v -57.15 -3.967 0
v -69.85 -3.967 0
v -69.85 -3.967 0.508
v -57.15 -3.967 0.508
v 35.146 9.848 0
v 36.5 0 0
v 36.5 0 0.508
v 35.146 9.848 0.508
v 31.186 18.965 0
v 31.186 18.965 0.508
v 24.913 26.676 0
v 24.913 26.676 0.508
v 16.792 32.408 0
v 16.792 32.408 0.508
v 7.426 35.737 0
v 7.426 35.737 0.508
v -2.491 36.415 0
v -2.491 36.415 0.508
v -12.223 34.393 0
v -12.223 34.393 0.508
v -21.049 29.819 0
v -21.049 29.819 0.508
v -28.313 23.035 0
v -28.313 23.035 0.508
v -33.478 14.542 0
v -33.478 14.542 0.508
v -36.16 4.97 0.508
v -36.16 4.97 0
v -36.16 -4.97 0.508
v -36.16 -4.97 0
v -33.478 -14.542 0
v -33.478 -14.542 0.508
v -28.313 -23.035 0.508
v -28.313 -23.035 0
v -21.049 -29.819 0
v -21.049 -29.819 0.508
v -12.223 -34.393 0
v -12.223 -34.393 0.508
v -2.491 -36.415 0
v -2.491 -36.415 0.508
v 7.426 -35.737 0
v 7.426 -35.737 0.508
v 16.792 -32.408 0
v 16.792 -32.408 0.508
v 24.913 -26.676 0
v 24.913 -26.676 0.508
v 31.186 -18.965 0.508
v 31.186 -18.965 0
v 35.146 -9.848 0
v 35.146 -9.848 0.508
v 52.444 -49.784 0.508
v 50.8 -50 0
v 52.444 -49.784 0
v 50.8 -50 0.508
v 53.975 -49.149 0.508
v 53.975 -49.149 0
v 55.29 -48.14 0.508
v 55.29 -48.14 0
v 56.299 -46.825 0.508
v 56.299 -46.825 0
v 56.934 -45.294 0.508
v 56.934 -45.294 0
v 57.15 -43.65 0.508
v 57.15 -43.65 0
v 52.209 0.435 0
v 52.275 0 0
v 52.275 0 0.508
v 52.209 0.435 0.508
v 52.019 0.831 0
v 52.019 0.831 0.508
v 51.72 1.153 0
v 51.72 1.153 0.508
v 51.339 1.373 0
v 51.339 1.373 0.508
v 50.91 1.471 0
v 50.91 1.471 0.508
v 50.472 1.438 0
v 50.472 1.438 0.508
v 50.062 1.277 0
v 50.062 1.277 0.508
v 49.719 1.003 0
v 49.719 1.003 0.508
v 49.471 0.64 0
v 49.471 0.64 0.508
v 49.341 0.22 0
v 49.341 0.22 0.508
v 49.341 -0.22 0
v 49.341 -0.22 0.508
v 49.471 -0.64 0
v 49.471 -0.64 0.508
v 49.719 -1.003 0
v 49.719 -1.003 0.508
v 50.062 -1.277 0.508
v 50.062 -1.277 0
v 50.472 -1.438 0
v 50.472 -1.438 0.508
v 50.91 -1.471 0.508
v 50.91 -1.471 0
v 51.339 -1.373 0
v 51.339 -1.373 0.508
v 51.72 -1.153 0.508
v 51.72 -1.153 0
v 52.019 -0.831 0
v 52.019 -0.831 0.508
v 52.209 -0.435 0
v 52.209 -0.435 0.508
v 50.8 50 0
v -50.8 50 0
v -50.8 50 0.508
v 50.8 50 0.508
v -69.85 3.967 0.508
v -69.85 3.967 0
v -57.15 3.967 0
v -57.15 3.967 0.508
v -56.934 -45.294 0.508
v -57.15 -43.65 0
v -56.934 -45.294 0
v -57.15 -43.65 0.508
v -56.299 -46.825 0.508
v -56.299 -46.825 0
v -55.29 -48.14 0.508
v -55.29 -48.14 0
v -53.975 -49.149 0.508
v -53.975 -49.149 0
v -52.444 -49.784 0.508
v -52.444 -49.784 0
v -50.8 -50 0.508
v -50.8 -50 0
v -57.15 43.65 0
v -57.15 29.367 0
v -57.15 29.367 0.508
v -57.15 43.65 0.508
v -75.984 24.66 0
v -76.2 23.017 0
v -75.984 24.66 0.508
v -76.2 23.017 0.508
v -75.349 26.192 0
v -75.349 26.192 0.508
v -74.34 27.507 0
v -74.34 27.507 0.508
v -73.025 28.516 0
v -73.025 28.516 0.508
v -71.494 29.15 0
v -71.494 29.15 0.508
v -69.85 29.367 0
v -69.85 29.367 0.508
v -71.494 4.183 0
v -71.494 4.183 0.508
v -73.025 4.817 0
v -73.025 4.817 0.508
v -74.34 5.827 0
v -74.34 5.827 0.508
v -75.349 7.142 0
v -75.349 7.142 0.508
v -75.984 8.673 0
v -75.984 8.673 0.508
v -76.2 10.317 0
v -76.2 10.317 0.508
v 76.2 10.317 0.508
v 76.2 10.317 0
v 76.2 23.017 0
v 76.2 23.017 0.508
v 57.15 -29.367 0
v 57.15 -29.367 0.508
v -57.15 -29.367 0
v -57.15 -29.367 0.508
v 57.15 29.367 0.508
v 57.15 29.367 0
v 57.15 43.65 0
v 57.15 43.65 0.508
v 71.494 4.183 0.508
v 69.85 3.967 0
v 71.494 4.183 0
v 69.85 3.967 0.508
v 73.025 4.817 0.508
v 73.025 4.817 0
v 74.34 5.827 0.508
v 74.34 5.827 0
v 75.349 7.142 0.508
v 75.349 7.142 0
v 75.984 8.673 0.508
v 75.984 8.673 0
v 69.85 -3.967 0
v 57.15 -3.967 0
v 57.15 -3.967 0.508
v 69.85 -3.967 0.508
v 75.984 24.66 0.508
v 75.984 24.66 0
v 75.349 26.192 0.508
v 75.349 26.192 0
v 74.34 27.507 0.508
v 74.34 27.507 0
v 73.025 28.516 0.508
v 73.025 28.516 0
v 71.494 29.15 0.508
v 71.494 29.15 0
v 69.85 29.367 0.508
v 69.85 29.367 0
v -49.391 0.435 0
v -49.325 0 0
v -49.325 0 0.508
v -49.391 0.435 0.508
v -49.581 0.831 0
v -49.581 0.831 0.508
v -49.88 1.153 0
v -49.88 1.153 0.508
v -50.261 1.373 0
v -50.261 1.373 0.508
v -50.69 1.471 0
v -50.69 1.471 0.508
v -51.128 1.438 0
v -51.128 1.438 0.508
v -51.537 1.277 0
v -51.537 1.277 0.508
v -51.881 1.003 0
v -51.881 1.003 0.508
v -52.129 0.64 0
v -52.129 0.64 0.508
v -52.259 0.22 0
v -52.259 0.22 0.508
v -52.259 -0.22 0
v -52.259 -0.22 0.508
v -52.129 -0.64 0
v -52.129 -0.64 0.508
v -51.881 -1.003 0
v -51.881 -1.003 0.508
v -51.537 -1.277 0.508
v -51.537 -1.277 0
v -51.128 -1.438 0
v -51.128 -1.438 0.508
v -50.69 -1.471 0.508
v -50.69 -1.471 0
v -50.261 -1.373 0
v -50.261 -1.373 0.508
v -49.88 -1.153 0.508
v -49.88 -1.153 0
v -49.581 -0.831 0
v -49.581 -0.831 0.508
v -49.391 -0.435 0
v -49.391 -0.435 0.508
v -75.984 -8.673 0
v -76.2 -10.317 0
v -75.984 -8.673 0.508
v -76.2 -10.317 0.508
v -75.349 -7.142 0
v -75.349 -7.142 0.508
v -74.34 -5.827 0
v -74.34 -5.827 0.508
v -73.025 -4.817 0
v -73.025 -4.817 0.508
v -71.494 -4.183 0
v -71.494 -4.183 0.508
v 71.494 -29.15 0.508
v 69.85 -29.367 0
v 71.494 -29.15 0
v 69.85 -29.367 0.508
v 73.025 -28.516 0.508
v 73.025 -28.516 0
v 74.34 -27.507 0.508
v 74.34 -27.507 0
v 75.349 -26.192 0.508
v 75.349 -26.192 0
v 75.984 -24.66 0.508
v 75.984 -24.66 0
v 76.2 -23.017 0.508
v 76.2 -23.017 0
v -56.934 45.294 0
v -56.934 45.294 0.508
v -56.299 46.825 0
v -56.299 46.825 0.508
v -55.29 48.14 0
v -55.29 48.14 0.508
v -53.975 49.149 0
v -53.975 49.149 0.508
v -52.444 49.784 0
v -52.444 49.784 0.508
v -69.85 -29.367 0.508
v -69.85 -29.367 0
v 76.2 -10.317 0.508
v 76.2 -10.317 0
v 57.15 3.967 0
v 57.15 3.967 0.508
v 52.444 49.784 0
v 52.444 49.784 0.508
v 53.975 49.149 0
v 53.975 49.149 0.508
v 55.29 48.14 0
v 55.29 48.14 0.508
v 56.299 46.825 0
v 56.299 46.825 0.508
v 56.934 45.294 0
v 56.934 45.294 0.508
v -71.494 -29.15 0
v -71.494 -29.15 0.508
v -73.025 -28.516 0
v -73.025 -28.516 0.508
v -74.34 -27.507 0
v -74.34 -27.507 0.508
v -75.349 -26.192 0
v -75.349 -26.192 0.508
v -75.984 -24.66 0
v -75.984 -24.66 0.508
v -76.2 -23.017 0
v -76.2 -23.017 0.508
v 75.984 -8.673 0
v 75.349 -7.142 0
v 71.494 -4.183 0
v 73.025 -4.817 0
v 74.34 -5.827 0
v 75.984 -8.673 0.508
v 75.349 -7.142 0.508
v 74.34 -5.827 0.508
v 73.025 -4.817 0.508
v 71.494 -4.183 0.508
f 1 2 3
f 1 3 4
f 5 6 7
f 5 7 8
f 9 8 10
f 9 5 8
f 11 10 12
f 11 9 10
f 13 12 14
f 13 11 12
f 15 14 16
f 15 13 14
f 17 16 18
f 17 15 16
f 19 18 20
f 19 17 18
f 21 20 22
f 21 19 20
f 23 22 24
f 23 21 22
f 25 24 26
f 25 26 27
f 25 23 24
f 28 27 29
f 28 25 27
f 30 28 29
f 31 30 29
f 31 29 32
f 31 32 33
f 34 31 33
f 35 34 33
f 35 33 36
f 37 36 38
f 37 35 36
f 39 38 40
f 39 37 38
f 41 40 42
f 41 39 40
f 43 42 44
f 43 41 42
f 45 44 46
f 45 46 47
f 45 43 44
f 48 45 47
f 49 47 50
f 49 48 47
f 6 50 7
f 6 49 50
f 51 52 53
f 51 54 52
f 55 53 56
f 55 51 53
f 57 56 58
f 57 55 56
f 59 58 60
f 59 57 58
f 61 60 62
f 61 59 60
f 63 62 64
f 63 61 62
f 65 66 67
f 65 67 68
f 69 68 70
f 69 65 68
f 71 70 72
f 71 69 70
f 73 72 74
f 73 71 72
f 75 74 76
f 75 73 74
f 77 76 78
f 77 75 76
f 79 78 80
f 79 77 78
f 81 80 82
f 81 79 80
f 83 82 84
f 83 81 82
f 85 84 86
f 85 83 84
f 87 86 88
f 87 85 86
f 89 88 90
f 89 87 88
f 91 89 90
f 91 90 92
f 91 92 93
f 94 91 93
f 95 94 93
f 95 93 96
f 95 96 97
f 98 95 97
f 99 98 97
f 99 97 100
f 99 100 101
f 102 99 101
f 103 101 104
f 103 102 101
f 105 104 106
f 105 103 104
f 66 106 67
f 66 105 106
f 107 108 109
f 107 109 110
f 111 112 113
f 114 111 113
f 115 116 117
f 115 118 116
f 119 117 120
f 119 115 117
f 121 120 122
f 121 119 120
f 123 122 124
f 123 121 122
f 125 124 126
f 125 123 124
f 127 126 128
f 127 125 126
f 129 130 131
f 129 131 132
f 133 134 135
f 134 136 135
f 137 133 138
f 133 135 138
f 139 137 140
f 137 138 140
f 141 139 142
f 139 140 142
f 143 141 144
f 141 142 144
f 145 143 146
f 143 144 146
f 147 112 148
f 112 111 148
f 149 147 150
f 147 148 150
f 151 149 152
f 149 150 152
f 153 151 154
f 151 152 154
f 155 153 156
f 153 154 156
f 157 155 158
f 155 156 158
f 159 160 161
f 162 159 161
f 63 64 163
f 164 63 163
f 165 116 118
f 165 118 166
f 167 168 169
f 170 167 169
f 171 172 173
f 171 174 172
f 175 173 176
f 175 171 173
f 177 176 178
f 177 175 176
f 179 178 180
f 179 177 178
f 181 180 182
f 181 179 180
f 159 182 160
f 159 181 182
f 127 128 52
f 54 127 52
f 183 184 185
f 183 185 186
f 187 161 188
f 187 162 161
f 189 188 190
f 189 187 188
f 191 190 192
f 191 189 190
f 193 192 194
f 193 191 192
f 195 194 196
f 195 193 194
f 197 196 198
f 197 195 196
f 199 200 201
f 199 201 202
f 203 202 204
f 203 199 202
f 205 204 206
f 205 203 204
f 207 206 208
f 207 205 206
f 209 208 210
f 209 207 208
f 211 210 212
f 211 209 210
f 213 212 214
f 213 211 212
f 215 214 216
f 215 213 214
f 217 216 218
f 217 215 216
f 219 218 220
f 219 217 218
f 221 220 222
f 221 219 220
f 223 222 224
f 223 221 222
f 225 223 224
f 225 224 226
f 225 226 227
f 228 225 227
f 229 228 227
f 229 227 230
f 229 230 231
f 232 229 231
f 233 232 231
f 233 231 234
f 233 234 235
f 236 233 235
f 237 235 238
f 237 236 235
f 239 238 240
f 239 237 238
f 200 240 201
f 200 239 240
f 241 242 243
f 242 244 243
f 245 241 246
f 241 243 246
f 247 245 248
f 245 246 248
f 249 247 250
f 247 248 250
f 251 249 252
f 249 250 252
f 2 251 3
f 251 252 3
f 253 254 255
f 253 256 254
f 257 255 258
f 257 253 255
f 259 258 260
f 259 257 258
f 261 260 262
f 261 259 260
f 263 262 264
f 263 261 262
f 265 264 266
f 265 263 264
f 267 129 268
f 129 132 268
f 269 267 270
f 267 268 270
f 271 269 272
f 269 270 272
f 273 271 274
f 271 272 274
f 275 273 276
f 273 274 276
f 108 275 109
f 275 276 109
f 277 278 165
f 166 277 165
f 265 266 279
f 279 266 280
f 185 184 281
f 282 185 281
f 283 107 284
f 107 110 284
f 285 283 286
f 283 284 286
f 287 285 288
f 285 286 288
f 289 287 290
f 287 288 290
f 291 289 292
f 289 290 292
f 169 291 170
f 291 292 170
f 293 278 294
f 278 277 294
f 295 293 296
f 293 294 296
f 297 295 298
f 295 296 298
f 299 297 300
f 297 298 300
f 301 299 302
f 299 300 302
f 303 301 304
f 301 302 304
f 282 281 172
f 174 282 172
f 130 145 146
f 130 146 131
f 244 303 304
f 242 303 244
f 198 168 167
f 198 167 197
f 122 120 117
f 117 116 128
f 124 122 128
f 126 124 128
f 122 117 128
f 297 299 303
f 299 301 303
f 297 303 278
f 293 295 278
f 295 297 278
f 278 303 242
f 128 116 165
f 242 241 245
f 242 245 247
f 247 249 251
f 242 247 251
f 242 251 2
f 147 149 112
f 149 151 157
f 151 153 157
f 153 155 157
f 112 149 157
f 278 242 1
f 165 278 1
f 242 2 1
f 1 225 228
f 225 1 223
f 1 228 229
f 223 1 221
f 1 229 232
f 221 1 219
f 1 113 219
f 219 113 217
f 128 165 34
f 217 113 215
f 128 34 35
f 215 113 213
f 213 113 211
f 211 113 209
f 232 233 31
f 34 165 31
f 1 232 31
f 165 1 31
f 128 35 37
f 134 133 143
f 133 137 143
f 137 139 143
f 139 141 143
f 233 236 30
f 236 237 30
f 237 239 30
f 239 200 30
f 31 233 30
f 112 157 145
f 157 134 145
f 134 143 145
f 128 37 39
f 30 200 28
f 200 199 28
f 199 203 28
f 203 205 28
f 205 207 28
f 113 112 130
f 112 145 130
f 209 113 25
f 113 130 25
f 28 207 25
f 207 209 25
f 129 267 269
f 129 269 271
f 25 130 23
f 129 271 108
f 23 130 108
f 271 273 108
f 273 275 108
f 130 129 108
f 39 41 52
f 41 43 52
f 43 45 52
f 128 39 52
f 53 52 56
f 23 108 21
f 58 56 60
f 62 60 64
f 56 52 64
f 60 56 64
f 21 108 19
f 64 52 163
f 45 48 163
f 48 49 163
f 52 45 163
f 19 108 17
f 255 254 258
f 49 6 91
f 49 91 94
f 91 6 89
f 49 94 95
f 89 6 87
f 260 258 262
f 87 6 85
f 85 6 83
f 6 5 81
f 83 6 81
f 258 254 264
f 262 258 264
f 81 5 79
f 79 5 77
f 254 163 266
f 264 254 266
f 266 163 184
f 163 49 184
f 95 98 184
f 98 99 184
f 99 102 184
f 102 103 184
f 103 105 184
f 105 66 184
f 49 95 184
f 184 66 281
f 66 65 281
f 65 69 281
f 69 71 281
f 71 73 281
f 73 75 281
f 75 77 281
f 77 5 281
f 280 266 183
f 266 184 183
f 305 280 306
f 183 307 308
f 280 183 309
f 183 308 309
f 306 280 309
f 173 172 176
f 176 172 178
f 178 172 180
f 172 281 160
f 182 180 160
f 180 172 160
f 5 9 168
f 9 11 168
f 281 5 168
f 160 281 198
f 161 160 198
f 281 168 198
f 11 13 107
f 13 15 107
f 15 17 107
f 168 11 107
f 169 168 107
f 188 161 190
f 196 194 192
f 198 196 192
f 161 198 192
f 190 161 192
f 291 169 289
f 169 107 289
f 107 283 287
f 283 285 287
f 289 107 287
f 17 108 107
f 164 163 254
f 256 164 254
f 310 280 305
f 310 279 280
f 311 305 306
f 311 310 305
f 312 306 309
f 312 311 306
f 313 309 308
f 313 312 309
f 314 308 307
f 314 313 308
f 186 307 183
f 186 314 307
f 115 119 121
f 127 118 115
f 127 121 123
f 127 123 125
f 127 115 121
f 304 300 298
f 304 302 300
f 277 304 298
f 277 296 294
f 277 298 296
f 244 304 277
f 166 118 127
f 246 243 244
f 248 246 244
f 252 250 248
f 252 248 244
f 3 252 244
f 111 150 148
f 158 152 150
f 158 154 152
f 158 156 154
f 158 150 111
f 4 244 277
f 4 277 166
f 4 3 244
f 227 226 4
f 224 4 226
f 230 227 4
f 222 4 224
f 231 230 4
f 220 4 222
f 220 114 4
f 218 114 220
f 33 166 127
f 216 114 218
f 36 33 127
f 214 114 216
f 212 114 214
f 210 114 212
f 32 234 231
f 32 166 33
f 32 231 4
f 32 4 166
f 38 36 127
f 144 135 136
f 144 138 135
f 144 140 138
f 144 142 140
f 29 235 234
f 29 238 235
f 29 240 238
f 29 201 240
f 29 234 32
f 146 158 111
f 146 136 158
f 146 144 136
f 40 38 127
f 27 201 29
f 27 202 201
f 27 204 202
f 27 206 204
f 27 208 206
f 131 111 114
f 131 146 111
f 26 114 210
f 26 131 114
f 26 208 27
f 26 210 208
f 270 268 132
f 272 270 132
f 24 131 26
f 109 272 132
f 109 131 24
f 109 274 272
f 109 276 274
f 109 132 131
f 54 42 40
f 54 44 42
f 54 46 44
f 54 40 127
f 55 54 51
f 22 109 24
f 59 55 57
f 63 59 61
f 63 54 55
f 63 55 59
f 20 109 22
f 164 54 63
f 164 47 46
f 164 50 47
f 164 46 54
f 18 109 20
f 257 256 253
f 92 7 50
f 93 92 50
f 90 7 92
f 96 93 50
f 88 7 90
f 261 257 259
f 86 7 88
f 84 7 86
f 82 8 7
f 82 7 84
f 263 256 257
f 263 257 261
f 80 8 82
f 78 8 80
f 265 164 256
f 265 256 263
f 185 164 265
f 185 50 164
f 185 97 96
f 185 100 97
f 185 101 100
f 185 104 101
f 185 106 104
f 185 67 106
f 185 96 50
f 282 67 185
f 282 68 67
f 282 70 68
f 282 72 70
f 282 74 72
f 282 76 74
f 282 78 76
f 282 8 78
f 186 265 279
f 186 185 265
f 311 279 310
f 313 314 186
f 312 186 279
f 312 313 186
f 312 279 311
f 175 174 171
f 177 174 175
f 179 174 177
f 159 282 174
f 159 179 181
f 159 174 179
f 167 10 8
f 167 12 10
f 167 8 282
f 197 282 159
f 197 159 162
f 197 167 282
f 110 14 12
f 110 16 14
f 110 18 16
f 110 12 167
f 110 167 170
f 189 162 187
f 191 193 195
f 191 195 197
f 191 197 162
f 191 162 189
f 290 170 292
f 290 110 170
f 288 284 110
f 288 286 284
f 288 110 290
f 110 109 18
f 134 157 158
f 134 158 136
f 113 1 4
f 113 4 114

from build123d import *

# Parameters (mm, degrees)
SKETCH2_W           = 114.3
SKETCH2_H           = 100
SKETCH2_R           = 1.475
SKETCH2_R_2         = 36.5
SKETCH2_W_2         = 19.05
SKETCH2_H_2         = 25.4
BOSS_EXTRUDE1_DEPTH = 0.508
FILLET1_R           = 6.35


with BuildPart() as part:
    # Sketch2 → Boss-Extrude1 (new body)
    # profile 1 of 5: a face of its own
    with BuildSketch(Plane.XY):
        Rectangle(SKETCH2_W, SKETCH2_H)
        with Locations((50.8, 0)):
            Circle(SKETCH2_R, mode=Mode.SUBTRACT)
        with Locations((-50.8, 0)):
            Circle(SKETCH2_R, mode=Mode.SUBTRACT)
        Circle(SKETCH2_R_2, mode=Mode.SUBTRACT)
    # profile 2 of 5: a face of its own
    with BuildSketch(Plane.XY):
        with Locations((-66.675, 16.666666667)):
            Rectangle(SKETCH2_W_2, SKETCH2_H_2)
    # profile 3 of 5: a face of its own
    with BuildSketch(Plane.XY):
        with Locations((-66.675, -16.666666667)):
            Rectangle(SKETCH2_W_2, SKETCH2_H_2)
    # profile 4 of 5: a face of its own
    with BuildSketch(Plane.XY):
        with Locations((66.675, 16.666666667)):
            Rectangle(SKETCH2_W_2, SKETCH2_H_2)
    # profile 5 of 5: a face of its own
    with BuildSketch(Plane.XY):
        with Locations((66.675, -16.666666667)):
            Rectangle(SKETCH2_W_2, SKETCH2_H_2)
    extrude(amount=BOSS_EXTRUDE1_DEPTH)

    # Fillet1
    fillet1_edges = [part.edges().sort_by_distance(p)[0] for p in [
        (76.2, 29.366666667, 0.254),
        (76.2, 3.966666667, 0.254),
        (76.2, -3.966666667, 0.254),
        (76.2, -29.366666667, 0.254),
        (57.15, -50, 0.254),
        (-57.15, -50, 0.254),
        (-76.2, -29.366666667, 0.254),
        (-76.2, -3.966666667, 0.254),
        (-76.2, 3.966666667, 0.254),
        (-76.2, 29.366666667, 0.254),
        (-57.15, 50, 0.254),
        (57.15, 50, 0.254),
    ]]
    fillet(fillet1_edges, radius=FILLET1_R)


solid = part.part
